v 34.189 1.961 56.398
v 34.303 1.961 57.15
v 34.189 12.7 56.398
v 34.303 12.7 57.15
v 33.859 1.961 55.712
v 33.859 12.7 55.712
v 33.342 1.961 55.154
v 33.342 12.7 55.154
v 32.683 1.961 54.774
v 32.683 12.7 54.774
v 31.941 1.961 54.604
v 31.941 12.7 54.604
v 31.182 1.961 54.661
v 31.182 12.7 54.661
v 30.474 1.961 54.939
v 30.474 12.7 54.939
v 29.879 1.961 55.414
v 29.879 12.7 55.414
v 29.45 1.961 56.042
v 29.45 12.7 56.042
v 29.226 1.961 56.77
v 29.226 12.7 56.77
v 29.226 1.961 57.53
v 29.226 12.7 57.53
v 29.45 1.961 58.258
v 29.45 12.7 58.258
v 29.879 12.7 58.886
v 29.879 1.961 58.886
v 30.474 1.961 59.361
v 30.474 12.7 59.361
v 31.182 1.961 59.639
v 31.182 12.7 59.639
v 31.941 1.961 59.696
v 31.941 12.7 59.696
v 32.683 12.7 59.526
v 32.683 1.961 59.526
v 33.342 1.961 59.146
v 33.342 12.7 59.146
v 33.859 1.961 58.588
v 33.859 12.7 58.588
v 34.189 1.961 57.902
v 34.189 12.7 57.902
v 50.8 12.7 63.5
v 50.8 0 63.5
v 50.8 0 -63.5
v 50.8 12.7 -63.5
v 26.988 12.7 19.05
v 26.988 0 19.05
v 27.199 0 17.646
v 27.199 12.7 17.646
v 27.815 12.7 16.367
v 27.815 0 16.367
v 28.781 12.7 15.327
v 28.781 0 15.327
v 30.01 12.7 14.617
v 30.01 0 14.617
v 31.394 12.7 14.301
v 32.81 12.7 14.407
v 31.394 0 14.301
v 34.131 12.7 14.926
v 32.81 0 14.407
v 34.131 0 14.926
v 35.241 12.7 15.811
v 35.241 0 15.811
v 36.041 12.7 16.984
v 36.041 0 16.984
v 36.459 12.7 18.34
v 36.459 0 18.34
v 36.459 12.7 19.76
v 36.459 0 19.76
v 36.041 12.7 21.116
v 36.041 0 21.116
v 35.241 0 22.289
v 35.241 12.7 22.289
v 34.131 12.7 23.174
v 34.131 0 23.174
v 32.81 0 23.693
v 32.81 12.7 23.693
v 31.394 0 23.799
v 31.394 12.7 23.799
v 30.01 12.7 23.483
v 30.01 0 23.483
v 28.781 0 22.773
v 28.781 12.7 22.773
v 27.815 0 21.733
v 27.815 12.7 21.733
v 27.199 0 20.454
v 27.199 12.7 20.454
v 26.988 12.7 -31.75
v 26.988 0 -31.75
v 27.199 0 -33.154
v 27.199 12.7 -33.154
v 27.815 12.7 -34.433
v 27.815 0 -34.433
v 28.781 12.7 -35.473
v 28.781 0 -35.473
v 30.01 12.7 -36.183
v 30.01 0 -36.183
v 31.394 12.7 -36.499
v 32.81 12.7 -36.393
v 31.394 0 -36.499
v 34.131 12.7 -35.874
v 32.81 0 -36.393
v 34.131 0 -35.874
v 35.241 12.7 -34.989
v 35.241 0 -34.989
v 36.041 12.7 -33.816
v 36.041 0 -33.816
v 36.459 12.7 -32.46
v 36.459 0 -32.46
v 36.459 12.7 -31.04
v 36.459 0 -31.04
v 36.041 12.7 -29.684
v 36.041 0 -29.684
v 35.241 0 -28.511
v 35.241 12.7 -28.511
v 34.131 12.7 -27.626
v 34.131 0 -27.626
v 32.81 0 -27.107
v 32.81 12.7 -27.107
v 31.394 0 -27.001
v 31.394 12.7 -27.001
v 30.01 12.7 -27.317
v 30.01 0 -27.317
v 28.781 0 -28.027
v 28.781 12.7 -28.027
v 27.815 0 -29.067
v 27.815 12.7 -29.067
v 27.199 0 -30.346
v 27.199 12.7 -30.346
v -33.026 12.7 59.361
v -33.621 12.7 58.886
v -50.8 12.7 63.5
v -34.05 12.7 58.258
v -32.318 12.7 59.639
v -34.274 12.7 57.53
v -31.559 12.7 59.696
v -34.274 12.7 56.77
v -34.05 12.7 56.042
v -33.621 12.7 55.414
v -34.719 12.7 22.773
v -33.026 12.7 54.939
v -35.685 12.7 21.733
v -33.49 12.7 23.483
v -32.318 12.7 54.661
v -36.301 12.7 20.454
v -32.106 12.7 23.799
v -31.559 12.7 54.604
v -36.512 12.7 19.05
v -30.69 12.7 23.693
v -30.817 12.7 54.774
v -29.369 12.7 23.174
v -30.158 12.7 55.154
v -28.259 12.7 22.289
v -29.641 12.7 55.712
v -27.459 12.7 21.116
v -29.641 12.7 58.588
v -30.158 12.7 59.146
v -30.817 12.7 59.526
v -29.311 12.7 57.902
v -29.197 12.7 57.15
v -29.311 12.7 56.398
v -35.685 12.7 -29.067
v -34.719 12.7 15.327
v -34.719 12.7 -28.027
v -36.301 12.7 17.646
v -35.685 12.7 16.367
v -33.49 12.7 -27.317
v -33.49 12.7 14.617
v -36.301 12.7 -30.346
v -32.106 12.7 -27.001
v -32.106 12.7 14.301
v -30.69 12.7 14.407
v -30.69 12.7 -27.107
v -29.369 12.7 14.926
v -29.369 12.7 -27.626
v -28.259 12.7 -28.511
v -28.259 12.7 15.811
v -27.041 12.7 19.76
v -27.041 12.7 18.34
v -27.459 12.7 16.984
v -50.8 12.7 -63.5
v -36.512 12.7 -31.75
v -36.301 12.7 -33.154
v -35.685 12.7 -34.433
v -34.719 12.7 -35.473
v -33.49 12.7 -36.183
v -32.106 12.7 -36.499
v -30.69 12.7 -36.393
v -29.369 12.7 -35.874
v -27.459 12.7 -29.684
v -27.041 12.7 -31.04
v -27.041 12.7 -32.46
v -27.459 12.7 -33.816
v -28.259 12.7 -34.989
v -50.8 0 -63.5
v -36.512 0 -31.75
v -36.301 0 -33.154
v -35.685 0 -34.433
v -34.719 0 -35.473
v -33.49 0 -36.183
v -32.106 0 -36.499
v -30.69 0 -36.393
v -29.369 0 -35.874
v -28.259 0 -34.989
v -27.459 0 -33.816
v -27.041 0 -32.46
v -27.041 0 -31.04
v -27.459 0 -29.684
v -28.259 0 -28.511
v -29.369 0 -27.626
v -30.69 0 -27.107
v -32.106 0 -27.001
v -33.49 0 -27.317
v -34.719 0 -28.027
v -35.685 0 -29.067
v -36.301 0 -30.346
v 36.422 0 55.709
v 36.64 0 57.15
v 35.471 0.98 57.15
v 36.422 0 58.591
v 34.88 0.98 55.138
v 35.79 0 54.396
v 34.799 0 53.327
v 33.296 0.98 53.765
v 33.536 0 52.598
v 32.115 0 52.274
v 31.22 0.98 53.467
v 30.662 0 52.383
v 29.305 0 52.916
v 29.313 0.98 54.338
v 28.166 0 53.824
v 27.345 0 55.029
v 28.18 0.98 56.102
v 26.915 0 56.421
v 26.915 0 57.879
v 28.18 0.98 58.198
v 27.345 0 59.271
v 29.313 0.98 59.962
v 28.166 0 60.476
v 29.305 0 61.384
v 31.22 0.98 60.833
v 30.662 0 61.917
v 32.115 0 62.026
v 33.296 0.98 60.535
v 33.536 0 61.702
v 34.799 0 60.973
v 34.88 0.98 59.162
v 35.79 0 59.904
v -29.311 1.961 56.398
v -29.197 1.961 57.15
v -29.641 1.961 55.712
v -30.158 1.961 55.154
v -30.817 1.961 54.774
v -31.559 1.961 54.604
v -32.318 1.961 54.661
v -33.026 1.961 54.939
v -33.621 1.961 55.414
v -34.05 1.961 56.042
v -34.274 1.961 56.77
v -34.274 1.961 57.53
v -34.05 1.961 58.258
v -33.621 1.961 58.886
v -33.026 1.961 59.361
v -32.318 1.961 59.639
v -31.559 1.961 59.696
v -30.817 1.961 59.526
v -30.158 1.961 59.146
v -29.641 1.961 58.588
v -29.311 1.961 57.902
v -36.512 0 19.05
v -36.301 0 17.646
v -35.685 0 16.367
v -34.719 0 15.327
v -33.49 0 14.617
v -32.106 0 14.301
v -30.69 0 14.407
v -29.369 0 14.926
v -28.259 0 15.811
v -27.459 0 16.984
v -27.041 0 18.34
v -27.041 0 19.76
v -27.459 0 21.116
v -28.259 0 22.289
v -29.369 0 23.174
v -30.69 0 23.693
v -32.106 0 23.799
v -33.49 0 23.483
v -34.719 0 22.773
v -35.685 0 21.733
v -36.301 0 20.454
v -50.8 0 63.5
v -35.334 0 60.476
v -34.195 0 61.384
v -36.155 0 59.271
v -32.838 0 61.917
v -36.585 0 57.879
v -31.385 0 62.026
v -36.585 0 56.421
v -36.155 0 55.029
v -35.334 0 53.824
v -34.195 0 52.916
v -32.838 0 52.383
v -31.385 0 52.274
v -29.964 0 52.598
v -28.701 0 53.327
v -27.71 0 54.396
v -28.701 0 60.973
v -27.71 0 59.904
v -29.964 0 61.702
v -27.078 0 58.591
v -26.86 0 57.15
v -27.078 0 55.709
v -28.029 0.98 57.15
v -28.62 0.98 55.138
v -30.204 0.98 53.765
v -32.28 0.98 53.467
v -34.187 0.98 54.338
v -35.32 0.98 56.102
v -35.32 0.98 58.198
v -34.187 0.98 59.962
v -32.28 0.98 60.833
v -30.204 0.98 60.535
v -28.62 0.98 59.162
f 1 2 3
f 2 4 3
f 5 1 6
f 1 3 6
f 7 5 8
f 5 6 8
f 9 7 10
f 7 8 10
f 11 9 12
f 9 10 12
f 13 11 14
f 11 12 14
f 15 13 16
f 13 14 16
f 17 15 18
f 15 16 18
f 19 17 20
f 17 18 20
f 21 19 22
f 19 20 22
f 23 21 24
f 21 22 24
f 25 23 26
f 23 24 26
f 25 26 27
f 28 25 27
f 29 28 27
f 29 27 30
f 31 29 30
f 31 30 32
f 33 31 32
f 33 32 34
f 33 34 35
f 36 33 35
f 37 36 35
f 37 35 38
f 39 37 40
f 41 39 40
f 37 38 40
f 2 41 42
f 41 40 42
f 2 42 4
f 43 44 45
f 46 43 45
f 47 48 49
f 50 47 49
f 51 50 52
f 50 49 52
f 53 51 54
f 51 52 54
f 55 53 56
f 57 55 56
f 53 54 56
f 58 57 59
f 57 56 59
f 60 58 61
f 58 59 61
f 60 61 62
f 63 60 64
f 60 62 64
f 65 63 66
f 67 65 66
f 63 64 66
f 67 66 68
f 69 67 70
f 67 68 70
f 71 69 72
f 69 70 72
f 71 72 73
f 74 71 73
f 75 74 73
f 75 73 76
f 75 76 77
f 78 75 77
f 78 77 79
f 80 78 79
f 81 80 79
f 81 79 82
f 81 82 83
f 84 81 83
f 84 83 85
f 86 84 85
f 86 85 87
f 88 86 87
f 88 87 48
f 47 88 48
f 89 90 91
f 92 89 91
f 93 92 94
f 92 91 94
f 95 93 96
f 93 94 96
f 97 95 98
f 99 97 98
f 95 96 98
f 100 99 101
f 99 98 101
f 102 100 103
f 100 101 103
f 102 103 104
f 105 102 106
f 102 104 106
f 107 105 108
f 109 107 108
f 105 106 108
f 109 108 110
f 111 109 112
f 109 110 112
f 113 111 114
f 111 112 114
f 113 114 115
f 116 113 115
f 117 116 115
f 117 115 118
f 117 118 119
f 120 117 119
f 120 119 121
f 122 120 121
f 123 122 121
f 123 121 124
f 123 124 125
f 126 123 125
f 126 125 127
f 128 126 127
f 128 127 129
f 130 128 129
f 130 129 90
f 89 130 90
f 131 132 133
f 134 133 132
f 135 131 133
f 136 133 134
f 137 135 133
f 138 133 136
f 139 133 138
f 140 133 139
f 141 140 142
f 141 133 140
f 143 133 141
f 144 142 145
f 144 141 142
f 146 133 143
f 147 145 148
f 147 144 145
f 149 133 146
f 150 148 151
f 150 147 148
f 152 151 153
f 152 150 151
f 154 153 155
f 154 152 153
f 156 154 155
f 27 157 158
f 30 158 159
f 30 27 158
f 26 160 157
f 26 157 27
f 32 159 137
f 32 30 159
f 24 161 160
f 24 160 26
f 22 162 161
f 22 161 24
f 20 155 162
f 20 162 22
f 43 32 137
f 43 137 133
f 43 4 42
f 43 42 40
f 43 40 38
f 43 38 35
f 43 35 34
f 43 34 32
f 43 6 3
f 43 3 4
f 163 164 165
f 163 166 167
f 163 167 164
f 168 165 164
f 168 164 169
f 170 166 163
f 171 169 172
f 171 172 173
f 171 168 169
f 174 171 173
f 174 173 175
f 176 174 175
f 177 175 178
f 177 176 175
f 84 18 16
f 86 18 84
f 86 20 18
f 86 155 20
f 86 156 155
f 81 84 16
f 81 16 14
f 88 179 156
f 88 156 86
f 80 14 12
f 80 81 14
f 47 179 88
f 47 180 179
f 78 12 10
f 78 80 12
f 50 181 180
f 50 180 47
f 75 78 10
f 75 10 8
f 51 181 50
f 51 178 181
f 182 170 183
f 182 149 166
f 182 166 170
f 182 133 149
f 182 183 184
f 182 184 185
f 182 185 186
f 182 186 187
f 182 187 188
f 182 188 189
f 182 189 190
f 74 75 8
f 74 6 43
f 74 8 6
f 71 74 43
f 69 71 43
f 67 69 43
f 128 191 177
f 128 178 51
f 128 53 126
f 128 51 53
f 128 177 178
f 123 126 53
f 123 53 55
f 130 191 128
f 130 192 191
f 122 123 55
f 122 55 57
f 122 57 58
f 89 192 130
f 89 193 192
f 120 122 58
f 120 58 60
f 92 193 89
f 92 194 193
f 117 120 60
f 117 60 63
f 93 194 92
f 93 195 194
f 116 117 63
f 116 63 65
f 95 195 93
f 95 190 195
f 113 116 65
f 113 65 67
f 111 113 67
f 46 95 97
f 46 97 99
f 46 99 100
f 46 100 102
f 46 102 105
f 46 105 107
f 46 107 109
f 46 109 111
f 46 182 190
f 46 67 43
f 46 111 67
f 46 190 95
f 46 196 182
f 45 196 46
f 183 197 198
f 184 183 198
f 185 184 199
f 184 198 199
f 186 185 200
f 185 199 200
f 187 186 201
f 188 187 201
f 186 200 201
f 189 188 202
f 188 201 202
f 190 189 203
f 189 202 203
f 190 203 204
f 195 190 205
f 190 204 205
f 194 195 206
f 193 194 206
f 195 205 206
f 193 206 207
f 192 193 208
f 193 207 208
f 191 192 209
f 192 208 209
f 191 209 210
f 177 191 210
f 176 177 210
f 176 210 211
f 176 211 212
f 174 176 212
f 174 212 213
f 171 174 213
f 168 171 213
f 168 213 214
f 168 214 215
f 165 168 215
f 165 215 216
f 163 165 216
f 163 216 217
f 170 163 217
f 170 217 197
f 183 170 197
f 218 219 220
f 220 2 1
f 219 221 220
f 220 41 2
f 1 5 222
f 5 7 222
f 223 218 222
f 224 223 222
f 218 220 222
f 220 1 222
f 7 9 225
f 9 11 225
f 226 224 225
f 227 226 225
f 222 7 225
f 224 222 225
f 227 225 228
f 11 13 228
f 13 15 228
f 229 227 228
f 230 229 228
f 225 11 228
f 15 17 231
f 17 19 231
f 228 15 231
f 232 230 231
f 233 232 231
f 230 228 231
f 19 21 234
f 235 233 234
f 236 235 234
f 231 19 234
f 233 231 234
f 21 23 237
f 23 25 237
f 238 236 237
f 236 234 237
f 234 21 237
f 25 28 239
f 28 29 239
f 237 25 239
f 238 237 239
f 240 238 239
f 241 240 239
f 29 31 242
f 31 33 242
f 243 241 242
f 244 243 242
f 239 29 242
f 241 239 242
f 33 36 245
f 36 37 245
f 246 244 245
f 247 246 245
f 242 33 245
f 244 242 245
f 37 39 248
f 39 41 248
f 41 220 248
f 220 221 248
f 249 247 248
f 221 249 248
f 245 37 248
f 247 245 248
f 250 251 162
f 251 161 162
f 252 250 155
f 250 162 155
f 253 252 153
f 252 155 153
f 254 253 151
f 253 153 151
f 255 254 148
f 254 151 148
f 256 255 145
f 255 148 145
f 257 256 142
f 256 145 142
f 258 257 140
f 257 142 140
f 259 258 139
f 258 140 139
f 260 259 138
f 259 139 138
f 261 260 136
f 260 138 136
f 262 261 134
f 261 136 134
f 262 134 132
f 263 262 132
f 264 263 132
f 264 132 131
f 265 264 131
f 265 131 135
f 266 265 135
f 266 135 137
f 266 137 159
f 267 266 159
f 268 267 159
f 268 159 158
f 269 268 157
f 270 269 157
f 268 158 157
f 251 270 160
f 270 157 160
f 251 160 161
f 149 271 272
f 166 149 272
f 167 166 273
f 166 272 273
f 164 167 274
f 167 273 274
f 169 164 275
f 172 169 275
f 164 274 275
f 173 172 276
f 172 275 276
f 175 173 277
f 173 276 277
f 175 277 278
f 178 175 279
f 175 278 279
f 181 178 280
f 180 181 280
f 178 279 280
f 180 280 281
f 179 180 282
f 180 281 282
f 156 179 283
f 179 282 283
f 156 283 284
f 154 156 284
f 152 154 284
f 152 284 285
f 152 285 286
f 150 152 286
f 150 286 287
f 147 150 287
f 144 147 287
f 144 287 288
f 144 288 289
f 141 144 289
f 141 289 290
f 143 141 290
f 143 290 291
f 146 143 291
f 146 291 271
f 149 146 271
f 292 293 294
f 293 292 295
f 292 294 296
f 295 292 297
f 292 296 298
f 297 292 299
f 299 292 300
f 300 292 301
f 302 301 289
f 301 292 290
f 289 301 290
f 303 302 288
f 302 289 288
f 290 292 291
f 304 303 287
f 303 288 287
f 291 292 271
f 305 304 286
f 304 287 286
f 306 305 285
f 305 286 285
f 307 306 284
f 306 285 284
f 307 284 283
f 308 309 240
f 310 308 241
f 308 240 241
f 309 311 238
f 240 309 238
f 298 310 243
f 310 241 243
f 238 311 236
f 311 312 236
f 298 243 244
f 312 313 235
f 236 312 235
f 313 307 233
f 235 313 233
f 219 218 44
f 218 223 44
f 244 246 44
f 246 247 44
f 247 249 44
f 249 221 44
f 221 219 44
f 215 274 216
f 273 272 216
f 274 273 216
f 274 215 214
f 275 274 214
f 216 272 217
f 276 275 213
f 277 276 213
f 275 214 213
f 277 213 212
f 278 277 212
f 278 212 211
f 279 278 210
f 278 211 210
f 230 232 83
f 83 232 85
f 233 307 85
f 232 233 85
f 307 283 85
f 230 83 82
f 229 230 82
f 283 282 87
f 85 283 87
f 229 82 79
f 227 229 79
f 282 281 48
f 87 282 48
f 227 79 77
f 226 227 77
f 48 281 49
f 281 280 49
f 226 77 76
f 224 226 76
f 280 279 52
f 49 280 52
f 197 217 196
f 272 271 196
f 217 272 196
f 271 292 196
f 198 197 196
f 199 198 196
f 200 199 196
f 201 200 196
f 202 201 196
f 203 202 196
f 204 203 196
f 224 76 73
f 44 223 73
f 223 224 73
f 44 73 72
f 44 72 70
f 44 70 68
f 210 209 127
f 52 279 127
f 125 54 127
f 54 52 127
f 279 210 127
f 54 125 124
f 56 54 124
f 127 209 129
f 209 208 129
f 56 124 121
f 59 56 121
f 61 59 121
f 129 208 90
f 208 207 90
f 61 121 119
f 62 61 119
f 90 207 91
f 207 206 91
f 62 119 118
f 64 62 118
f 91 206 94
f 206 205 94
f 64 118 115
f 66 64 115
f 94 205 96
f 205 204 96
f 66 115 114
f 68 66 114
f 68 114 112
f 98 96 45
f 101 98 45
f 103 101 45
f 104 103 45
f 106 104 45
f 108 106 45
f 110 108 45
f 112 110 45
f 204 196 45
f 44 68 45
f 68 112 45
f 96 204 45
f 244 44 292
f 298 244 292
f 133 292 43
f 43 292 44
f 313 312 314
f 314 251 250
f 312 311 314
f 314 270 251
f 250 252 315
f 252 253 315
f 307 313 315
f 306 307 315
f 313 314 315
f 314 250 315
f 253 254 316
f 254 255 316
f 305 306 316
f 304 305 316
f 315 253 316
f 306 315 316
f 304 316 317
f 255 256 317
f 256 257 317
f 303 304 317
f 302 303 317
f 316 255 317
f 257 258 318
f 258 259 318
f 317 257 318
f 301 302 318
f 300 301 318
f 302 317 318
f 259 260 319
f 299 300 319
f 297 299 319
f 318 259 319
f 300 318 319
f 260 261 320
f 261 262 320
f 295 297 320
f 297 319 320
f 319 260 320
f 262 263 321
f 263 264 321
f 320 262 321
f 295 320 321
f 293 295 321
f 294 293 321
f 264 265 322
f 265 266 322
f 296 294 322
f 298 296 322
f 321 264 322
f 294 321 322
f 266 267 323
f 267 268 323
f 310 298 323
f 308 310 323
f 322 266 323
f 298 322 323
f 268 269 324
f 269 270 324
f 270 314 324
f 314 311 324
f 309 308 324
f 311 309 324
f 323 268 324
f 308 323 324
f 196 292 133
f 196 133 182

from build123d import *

# Parameters (mm, degrees)
SKETCH1_W                                          = 101.6
SKETCH1_H                                          = 127
BOSS_EXTRUDE1_DEPTH                                = 12.7
CSK_FOR_10_FLAT_HEAD_MACHINE_SCREW_100_D           = 5.1054
CSK_FOR_10_FLAT_HEAD_MACHINE_SCREW_100_DEPTH       = 12.7
CSK_FOR_10_FLAT_HEAD_MACHINE_SCREW_100_CSINK_D     = 9.779
CSK_FOR_10_FLAT_HEAD_MACHINE_SCREW_100_CSINK_ANGLE = 100
CSK_FOR_10_FLAT_HEAD_MACHINE_SCREW_100_TIP         = 1.533816902
F_3_8_0_375_DIAMETER_HOLE1_D                       = 9.525
F_3_8_0_375_DIAMETER_HOLE1_DEPTH                   = 25.4
F_3_8_0_375_DIAMETER_HOLE1_TIP                     = 2.861598698


with BuildPart() as part:
    # Sketch1 → Boss-Extrude1 (new body)
    with BuildSketch(Plane(origin=(0, 0, 0), x_dir=(1, 0, 0), z_dir=(0, 1, 0))):
        Rectangle(SKETCH1_W, SKETCH1_H)
    extrude(amount=BOSS_EXTRUDE1_DEPTH)

    # CSK for #10 Flat Head Machine Screw (100)1
    with Locations(Plane(origin=(0, 0, 0), x_dir=(-1, 0, 0), z_dir=(0, -1, 0))):
        with Locations((31.75, -57.15), (-31.75, -57.15)):
            CounterSinkHole(CSK_FOR_10_FLAT_HEAD_MACHINE_SCREW_100_D / 2, CSK_FOR_10_FLAT_HEAD_MACHINE_SCREW_100_CSINK_D / 2, depth=CSK_FOR_10_FLAT_HEAD_MACHINE_SCREW_100_DEPTH, counter_sink_angle=CSK_FOR_10_FLAT_HEAD_MACHINE_SCREW_100_CSINK_ANGLE)
            with Locations((0, 0, -(CSK_FOR_10_FLAT_HEAD_MACHINE_SCREW_100_DEPTH + CSK_FOR_10_FLAT_HEAD_MACHINE_SCREW_100_TIP / 2))):  # 118° drill point
                Cone(0, CSK_FOR_10_FLAT_HEAD_MACHINE_SCREW_100_D / 2, CSK_FOR_10_FLAT_HEAD_MACHINE_SCREW_100_TIP, mode=Mode.SUBTRACT)

    # 3/8 (0.375) Diameter Hole1
    with Locations(Plane(origin=(0, 12.7, 0), x_dir=(1, 0, 0), z_dir=(0, 1, 0))):
        with Locations((-31.75, 31.75), (31.75, 31.75), (-31.75, -19.05), (31.75, -19.05)):
            Hole(F_3_8_0_375_DIAMETER_HOLE1_D / 2, depth=F_3_8_0_375_DIAMETER_HOLE1_DEPTH)
            with Locations((0, 0, -(F_3_8_0_375_DIAMETER_HOLE1_DEPTH + F_3_8_0_375_DIAMETER_HOLE1_TIP / 2))):  # 118° drill point
                Cone(0, F_3_8_0_375_DIAMETER_HOLE1_D / 2, F_3_8_0_375_DIAMETER_HOLE1_TIP, mode=Mode.SUBTRACT)


solid = part.part
